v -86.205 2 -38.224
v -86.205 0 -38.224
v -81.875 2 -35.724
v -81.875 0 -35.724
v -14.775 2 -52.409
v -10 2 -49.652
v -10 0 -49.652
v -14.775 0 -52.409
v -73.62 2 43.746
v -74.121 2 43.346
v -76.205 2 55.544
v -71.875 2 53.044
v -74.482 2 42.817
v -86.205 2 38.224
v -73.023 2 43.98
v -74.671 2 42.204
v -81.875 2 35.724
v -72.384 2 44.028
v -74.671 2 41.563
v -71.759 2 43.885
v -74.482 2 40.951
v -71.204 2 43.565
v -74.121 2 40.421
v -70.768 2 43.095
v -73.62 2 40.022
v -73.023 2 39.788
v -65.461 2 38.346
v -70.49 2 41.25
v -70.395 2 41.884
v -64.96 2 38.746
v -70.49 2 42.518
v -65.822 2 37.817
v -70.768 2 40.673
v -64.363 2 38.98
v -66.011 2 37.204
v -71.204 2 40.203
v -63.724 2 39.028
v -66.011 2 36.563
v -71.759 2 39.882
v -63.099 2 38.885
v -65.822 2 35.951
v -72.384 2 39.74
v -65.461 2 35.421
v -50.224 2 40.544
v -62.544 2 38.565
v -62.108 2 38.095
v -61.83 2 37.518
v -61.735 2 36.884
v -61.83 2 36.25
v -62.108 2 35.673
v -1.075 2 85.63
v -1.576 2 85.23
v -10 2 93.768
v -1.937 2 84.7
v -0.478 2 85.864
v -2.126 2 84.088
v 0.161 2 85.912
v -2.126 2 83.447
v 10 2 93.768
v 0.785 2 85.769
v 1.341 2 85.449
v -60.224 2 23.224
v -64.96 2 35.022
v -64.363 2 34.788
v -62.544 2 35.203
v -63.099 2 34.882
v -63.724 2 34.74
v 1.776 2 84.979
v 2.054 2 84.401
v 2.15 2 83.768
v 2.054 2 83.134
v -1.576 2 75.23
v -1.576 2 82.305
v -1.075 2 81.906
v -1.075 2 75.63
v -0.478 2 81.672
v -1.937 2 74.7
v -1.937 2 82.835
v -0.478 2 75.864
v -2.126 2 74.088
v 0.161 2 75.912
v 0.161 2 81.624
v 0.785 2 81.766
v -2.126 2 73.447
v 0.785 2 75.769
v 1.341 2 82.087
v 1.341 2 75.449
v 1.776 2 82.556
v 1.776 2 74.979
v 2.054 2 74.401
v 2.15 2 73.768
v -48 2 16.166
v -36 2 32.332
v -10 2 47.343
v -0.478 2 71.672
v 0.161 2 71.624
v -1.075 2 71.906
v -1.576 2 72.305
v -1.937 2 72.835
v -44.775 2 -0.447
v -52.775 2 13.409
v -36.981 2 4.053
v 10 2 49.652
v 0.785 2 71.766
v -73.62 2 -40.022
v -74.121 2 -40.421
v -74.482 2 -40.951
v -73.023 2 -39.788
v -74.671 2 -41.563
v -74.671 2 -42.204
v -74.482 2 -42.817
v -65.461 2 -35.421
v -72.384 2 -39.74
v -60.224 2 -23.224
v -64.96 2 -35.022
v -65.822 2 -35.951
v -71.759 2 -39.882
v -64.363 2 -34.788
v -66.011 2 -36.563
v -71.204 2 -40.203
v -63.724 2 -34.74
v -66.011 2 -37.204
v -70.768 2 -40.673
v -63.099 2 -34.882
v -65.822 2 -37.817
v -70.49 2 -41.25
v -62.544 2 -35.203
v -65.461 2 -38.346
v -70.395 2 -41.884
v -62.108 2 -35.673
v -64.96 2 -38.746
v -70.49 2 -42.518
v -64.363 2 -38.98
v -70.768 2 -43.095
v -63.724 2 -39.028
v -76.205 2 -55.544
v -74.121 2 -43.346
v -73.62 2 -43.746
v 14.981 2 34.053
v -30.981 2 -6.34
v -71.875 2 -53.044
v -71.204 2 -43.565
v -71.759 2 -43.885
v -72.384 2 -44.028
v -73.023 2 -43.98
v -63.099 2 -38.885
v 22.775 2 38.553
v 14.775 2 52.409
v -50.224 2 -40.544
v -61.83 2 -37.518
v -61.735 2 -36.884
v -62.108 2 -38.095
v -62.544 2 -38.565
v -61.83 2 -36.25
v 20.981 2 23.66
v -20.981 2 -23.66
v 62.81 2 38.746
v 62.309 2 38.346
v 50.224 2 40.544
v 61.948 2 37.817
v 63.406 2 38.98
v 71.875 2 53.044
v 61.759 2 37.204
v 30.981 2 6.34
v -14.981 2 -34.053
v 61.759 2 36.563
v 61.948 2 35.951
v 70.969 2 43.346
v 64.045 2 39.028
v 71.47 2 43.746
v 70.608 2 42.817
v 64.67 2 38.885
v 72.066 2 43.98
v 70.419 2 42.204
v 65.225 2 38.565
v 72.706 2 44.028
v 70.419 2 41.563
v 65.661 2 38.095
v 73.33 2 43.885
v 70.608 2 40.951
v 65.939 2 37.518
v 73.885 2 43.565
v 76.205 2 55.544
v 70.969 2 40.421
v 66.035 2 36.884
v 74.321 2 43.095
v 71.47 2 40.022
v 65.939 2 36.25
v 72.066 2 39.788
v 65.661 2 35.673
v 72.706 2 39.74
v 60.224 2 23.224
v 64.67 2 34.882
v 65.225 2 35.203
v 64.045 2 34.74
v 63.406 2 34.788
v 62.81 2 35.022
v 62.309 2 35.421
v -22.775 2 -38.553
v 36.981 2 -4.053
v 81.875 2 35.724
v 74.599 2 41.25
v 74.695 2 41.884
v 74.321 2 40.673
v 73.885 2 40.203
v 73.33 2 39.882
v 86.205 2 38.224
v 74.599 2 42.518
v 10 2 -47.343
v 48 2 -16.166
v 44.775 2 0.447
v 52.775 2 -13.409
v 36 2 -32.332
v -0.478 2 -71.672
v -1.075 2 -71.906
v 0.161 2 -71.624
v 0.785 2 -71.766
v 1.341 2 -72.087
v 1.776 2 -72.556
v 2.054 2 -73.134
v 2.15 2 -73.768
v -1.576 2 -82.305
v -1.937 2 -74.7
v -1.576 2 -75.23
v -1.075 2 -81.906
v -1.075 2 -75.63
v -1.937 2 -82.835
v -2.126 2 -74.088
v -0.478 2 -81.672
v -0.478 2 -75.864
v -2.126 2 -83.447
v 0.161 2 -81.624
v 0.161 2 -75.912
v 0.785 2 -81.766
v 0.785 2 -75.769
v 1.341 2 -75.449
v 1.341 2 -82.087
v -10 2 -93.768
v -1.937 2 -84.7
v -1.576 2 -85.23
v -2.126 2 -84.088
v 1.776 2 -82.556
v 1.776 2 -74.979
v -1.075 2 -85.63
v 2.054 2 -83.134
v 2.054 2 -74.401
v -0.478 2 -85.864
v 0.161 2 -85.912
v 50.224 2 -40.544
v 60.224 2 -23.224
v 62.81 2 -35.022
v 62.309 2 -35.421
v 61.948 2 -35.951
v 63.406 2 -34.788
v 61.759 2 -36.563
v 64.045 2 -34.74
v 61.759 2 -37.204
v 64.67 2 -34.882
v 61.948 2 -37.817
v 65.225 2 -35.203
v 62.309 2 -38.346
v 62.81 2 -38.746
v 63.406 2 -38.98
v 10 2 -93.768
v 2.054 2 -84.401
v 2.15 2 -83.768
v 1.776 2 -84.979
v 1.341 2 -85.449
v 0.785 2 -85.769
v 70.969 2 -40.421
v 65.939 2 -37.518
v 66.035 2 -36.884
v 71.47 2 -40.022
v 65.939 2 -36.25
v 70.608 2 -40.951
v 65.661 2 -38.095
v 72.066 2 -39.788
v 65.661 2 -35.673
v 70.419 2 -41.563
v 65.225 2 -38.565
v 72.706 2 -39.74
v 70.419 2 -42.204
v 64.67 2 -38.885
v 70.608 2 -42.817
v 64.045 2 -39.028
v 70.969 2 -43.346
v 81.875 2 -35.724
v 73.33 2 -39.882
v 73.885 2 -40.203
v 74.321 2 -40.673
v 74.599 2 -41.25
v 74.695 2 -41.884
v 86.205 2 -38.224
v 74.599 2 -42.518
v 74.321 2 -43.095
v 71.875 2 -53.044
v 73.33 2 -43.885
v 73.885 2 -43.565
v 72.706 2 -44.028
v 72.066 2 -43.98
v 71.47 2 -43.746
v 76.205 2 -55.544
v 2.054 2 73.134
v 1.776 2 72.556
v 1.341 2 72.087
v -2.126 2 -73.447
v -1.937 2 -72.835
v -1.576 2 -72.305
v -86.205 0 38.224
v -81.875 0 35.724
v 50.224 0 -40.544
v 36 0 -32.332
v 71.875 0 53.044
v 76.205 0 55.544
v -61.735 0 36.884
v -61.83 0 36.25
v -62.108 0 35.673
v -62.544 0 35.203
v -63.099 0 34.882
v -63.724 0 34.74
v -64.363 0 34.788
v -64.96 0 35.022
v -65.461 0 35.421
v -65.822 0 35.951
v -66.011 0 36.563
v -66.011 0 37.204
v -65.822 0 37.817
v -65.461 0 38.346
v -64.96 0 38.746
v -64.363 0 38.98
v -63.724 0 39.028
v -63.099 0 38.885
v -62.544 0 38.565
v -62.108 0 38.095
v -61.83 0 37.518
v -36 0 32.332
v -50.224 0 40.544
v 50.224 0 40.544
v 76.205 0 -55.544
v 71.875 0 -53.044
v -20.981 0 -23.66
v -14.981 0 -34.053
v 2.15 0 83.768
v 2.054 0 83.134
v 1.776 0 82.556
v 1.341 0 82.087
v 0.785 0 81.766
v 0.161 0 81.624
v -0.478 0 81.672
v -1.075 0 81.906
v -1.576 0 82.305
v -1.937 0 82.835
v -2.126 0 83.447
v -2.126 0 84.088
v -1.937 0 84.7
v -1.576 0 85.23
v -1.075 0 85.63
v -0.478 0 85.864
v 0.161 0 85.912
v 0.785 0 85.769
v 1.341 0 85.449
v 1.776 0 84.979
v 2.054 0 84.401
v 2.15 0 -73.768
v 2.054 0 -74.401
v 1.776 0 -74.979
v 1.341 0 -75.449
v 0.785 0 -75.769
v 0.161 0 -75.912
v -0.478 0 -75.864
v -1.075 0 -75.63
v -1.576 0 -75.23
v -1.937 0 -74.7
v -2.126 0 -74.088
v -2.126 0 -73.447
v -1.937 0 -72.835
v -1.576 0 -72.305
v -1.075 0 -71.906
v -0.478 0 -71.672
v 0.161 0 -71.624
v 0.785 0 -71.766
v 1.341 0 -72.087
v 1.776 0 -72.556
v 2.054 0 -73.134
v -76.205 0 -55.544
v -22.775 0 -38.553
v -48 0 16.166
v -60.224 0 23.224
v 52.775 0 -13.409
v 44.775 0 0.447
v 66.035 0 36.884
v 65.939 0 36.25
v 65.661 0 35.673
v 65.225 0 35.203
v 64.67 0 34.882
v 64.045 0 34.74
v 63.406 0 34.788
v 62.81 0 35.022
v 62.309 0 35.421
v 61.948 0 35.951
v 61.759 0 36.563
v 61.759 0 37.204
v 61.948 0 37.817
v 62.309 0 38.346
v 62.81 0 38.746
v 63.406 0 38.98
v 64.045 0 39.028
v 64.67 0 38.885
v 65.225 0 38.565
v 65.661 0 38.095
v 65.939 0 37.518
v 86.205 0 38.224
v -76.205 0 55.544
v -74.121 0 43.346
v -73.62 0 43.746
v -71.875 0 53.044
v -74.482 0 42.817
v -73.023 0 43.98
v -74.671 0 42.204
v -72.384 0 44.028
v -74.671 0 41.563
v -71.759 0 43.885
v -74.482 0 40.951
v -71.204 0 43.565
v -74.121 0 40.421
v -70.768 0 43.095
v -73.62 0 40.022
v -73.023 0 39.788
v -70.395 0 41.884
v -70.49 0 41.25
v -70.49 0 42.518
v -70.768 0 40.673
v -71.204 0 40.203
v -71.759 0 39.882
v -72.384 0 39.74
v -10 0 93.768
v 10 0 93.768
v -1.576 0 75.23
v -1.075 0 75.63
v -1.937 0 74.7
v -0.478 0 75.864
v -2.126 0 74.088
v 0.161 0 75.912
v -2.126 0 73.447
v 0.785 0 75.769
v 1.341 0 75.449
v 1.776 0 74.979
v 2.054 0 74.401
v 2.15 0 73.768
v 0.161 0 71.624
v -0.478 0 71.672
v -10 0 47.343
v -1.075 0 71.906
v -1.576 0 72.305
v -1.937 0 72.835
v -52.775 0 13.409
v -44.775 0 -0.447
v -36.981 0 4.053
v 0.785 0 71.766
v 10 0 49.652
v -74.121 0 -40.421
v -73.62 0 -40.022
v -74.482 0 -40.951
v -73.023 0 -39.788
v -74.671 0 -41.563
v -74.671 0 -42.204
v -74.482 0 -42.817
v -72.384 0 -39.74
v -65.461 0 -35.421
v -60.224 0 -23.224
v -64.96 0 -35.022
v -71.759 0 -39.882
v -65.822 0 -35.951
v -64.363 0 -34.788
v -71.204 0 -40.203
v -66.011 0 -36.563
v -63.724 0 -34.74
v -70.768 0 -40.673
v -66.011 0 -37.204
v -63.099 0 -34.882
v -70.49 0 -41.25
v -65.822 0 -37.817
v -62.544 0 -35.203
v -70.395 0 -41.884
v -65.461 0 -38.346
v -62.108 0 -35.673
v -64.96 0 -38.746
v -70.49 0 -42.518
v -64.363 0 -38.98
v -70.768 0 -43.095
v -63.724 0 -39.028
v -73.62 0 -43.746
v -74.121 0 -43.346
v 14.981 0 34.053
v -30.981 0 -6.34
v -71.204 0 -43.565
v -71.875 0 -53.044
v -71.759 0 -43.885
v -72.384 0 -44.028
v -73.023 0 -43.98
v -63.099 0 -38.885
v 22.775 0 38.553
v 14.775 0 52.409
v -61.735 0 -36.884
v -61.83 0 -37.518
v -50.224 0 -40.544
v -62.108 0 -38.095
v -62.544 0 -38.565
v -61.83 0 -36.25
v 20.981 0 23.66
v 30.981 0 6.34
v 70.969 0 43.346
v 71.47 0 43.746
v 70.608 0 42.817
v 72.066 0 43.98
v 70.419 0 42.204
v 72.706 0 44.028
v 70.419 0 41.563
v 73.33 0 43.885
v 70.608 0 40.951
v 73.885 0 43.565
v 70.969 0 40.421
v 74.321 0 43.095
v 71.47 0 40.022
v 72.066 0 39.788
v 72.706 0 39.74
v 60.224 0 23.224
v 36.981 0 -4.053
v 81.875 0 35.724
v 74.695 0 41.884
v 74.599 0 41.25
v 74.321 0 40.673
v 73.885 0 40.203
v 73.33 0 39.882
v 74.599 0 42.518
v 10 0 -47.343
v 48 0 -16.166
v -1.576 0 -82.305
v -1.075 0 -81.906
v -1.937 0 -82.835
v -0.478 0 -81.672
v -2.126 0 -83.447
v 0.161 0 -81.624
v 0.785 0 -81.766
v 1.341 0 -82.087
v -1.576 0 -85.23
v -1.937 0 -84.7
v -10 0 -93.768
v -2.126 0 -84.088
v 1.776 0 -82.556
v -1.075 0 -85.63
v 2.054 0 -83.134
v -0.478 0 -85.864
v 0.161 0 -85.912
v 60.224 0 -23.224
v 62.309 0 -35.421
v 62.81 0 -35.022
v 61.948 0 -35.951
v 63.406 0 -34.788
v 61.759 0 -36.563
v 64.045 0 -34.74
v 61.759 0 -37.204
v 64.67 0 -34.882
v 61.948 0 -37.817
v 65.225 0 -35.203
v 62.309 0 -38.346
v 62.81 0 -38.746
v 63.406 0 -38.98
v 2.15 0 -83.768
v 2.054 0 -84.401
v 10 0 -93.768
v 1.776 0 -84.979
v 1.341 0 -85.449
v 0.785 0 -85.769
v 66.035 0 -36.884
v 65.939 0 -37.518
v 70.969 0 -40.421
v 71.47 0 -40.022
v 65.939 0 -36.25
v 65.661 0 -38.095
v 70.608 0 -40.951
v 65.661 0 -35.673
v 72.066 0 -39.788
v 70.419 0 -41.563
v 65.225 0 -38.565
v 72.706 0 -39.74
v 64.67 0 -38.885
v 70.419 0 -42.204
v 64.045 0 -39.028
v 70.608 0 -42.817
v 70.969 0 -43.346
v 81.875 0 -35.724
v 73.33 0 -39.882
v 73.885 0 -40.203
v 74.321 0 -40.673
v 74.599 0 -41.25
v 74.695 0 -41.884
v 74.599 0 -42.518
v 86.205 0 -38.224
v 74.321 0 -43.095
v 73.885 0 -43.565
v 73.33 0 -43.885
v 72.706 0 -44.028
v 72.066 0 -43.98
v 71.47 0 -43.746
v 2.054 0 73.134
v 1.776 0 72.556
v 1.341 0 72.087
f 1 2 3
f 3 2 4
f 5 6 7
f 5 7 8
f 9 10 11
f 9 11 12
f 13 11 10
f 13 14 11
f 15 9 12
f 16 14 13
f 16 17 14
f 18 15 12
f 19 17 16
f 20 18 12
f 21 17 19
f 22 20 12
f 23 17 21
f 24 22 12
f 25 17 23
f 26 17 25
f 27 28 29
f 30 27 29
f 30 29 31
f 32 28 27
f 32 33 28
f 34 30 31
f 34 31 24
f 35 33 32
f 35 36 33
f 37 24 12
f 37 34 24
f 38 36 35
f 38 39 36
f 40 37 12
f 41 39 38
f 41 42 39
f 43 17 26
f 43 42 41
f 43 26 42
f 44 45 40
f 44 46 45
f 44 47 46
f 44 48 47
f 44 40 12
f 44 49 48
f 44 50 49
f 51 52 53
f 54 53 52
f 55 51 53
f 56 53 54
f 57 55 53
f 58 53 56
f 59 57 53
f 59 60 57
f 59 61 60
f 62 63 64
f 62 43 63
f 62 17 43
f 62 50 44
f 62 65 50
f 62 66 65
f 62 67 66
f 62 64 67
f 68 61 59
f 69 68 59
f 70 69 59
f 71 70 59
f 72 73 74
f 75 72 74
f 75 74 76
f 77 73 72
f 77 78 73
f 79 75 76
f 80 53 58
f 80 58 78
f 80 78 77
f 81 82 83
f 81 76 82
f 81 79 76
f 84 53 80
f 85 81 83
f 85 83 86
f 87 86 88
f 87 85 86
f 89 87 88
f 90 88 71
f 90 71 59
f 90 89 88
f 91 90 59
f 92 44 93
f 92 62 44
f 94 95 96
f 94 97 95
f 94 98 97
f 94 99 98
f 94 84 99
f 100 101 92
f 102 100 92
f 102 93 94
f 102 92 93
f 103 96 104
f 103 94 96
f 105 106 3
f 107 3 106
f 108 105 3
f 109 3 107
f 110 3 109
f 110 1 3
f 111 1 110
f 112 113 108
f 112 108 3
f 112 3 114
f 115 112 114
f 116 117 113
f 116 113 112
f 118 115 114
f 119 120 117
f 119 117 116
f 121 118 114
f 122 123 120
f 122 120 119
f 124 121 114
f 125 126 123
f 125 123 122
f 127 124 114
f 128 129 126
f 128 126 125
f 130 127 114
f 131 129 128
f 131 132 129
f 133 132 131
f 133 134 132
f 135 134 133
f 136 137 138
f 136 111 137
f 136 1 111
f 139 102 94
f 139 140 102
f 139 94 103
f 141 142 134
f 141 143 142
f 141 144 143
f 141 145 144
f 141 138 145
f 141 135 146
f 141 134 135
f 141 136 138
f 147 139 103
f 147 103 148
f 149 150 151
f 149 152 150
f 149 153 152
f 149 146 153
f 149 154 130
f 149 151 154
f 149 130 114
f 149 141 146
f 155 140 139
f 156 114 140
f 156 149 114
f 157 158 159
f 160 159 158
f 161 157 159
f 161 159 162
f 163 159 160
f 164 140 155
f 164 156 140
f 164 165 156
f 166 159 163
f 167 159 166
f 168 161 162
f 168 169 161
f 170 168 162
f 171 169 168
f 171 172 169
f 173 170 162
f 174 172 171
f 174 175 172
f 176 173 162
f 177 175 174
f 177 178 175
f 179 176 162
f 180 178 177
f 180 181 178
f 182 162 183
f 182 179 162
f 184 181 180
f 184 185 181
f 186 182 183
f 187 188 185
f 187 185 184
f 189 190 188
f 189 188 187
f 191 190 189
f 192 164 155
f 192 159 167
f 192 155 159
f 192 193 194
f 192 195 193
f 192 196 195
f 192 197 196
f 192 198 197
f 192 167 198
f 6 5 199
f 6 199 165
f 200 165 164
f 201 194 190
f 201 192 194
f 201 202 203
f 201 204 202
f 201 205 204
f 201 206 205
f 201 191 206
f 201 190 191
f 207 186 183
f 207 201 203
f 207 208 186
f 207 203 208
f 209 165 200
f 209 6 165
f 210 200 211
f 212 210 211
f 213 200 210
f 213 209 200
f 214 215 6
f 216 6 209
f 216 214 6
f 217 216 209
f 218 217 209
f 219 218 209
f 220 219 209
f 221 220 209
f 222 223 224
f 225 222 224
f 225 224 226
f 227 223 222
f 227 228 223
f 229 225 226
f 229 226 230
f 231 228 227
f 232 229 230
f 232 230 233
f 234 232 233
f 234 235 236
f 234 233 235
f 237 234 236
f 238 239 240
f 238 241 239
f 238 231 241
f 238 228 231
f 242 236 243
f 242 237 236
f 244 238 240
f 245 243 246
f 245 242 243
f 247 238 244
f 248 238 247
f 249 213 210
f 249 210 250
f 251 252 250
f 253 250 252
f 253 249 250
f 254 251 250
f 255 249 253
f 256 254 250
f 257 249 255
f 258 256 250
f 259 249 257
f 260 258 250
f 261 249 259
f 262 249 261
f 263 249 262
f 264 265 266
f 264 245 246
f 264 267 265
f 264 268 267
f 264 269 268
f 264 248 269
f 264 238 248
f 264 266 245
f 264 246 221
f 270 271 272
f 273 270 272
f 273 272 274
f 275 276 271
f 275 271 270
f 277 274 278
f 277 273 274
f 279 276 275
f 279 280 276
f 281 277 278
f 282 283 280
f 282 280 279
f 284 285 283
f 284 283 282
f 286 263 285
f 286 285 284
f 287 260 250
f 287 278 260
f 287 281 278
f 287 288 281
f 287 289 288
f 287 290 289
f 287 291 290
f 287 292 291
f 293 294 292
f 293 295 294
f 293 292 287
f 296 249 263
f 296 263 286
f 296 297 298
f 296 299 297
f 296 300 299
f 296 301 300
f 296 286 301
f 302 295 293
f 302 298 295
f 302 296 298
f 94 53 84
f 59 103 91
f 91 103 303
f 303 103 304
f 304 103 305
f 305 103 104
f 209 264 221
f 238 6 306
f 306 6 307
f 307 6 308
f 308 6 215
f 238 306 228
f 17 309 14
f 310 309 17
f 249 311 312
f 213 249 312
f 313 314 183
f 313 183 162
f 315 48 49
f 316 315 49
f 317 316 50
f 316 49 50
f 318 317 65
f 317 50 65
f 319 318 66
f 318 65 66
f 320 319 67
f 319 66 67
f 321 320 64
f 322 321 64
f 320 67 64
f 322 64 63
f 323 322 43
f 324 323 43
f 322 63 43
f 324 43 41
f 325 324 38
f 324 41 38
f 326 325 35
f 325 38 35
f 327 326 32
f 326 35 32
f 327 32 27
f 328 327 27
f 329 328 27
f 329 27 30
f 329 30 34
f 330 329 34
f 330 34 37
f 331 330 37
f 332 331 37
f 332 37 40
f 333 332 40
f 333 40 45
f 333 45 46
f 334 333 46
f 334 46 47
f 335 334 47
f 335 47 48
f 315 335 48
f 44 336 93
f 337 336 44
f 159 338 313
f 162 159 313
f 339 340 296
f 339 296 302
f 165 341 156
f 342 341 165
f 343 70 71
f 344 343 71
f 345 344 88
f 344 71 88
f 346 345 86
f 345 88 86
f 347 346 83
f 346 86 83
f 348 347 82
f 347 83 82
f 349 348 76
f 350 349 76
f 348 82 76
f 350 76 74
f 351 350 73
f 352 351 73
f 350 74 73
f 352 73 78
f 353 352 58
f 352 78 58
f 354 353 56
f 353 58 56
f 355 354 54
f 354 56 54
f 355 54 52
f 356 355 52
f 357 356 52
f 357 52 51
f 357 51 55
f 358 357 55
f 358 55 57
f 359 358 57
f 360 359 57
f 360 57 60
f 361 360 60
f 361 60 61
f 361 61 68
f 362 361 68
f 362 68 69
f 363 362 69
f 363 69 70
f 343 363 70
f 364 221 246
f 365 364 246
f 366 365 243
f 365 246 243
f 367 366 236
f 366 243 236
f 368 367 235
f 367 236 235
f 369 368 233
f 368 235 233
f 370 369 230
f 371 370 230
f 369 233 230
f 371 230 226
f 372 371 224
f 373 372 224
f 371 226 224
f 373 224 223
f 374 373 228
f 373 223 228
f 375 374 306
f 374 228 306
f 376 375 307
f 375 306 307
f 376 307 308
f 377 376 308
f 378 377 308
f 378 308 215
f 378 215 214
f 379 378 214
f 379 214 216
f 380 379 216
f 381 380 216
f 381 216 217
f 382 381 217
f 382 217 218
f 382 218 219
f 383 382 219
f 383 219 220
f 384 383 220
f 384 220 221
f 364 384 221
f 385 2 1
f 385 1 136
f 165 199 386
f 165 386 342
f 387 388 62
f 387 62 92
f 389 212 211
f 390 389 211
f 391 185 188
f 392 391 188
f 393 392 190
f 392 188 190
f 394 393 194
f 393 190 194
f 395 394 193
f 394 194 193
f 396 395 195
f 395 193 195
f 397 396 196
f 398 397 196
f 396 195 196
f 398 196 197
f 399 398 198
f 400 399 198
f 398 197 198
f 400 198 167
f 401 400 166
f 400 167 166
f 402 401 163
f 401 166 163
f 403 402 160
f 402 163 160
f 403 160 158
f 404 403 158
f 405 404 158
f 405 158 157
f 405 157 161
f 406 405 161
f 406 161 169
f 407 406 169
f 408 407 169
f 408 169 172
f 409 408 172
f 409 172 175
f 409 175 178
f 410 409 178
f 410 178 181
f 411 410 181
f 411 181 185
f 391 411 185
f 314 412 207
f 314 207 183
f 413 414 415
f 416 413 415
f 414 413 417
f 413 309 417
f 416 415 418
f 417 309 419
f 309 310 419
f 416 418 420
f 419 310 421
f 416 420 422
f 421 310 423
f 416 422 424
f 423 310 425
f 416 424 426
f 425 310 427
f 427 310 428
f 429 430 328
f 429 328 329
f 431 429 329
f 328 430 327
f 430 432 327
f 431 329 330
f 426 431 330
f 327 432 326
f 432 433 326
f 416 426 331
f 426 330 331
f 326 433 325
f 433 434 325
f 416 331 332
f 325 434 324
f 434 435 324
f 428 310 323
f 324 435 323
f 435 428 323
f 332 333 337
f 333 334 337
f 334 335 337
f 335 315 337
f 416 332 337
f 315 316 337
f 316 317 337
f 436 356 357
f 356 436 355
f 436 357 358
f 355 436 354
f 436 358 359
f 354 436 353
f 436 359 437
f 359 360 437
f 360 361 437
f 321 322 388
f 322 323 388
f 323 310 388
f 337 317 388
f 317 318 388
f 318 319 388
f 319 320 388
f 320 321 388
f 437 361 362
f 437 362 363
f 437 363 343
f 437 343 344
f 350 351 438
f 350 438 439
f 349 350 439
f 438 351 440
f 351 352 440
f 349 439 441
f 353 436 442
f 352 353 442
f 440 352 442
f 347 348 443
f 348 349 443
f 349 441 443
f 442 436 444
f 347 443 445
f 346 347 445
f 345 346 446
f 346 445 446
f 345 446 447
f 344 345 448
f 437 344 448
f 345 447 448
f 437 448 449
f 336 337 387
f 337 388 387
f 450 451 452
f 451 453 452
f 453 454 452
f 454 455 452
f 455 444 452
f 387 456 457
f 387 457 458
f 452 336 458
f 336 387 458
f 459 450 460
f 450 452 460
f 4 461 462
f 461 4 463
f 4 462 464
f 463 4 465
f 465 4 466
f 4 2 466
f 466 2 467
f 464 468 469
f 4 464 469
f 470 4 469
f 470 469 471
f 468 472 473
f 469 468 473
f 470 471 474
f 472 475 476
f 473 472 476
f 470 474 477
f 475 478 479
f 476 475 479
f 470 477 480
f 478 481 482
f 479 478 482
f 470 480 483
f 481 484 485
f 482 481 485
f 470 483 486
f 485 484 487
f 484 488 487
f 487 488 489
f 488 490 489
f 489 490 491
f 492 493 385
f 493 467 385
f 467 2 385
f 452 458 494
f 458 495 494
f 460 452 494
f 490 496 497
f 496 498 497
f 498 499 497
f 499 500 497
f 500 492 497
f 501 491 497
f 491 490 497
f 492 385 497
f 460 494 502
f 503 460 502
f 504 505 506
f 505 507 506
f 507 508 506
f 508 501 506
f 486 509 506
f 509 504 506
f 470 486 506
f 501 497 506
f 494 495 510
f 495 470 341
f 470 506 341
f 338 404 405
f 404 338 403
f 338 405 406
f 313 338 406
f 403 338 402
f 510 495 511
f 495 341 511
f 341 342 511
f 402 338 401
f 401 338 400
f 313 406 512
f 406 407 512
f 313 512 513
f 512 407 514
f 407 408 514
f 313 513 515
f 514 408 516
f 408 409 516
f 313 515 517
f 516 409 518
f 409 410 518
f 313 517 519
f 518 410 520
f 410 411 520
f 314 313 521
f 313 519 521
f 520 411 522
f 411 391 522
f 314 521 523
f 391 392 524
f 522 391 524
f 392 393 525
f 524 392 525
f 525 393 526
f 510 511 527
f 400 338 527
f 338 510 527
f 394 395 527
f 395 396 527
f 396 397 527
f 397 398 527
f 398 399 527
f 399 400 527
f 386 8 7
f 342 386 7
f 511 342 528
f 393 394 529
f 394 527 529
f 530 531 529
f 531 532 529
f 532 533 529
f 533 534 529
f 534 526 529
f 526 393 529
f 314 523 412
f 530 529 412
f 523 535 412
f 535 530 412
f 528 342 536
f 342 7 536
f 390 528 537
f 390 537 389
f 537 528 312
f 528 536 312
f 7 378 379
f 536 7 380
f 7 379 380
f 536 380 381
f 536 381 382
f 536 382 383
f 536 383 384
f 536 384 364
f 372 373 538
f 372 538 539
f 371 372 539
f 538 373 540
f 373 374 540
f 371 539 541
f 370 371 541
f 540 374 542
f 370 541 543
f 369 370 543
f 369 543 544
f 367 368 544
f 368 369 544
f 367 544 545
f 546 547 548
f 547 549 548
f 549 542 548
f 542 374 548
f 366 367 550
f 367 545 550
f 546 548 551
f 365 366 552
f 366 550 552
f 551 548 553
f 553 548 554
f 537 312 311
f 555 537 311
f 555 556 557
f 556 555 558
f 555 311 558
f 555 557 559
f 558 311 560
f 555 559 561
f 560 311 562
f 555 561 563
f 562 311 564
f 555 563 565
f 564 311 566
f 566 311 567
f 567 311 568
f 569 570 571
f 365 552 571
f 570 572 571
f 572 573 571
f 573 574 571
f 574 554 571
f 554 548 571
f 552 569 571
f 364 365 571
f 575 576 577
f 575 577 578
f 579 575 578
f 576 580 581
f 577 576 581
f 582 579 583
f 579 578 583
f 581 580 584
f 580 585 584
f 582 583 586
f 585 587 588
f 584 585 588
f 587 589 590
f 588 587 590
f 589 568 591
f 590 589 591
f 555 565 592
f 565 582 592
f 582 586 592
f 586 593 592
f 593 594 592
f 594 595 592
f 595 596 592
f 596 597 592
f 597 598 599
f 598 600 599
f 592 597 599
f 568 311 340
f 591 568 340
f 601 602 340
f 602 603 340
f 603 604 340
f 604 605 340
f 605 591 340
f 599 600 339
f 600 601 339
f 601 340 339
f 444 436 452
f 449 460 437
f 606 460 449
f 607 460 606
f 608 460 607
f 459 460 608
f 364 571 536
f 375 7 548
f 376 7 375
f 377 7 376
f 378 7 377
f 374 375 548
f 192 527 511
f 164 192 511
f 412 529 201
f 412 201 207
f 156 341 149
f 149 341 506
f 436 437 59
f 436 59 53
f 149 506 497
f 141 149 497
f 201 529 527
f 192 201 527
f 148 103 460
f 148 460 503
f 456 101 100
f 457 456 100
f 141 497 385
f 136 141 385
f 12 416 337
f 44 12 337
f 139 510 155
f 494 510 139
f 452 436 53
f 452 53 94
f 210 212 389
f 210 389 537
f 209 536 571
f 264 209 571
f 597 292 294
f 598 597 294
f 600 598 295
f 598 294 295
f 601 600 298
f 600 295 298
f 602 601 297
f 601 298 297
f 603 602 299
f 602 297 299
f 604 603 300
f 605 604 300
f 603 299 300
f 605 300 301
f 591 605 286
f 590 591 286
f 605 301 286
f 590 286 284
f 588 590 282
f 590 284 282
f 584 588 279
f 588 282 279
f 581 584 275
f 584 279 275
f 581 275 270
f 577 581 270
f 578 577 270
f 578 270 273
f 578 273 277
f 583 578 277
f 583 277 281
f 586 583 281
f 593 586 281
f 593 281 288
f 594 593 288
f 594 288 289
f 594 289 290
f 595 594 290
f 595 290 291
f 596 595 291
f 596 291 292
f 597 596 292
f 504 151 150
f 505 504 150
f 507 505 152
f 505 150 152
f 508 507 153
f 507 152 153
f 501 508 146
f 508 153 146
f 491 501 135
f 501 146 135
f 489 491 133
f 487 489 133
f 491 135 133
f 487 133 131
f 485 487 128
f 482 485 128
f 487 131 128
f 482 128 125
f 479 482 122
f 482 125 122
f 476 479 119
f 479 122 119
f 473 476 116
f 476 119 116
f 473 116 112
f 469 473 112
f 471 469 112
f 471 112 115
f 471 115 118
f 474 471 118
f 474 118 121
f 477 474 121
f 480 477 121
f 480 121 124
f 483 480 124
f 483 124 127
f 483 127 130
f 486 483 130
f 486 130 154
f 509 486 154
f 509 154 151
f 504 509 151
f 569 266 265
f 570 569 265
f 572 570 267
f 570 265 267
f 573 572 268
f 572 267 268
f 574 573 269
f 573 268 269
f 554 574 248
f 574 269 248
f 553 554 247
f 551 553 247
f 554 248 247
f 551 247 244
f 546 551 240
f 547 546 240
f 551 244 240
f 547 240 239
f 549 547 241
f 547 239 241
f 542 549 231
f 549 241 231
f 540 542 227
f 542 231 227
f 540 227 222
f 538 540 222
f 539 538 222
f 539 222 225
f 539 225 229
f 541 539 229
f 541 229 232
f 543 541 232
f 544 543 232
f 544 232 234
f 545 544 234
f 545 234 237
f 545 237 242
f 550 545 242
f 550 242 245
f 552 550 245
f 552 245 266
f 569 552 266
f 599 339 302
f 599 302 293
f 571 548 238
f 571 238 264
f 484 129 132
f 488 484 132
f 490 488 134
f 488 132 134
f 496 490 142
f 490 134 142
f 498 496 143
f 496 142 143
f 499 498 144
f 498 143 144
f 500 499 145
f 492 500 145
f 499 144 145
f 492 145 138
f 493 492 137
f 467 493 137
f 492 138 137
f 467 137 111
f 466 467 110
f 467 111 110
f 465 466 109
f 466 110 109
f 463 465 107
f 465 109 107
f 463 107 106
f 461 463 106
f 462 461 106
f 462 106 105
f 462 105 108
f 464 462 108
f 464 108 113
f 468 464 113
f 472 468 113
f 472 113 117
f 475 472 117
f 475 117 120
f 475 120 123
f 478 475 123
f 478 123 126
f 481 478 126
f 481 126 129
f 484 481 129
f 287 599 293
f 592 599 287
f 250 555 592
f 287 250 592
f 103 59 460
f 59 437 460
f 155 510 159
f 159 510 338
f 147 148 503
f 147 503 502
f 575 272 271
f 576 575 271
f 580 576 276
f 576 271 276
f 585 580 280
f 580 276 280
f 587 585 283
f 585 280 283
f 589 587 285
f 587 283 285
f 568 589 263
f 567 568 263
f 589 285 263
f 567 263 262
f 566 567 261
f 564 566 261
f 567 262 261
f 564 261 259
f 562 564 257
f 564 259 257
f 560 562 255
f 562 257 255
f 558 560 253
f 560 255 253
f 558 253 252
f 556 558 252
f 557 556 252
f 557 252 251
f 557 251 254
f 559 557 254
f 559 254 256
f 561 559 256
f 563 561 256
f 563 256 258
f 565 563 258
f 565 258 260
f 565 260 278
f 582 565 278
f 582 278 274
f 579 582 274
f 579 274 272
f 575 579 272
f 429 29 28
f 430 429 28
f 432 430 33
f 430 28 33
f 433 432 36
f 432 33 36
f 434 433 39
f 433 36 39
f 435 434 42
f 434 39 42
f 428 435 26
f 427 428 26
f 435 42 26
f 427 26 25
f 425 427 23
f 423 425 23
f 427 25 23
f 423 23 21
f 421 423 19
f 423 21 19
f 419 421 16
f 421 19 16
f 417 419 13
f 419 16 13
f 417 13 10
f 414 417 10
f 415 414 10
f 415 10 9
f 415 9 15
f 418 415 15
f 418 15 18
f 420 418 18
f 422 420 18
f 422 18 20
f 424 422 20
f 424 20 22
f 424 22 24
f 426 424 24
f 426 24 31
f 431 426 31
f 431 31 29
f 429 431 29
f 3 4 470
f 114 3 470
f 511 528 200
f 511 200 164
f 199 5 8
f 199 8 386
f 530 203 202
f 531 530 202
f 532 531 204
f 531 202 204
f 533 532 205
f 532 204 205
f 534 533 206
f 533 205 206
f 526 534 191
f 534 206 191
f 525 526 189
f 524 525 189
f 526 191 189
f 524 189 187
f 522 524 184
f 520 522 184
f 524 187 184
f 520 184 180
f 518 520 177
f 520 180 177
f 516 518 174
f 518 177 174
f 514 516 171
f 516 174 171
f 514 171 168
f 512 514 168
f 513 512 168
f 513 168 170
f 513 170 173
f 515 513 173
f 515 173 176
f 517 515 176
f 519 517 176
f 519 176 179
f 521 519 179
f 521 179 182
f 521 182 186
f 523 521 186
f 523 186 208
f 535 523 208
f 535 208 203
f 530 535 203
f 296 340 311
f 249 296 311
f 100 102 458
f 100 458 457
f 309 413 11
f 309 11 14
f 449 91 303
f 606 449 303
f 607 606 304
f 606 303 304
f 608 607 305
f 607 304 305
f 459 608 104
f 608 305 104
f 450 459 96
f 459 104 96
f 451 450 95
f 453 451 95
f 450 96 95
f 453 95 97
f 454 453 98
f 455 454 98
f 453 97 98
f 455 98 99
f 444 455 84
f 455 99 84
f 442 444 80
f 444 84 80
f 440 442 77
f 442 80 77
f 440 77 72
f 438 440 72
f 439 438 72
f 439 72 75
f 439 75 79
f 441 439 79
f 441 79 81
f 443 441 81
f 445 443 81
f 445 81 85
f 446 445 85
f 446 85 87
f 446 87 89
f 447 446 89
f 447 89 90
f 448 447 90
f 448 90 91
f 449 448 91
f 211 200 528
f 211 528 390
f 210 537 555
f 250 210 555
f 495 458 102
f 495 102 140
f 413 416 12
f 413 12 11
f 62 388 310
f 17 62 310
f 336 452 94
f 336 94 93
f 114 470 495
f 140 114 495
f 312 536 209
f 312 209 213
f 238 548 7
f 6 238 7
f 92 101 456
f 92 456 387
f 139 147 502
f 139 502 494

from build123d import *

# Parameters (mm, degrees)
BOSS_EXTRUDE2_DEPTH = 2
SKETCH2_R           = 2.15
CUT_EXTRUDE1_DEPTH  = 10
CUT_EXTRUDE3_DEPTH  = 30
BOSS_EXTRUDE4_DEPTH = 2
SKETCH9_W           = 20
SKETCH9_H           = 40
BOSS_EXTRUDE5_DEPTH = 2
CUT_EXTRUDE4_DEPTH  = 2
BOSS_EXTRUDE6_DEPTH = 2
BOSS_EXTRUDE7_DEPTH = 2
CUT_EXTRUDE5_DEPTH  = 2


with BuildPart() as part:
    # Sketch1 → Boss-Extrude2 (new body)
    with BuildSketch(Plane(origin=(0, 0, 0), x_dir=(1, 0, 0), z_dir=(0, 1, 0))):
        Polygon((102.5, 0), (51.25, 88.767603888), (-51.25, 88.767603888), (-102.5, 0), (-51.25, -88.767603888), (51.25, -88.767603888), align=None)
        Polygon((73.632486541, 0), (36.81624327, 63.767603888), (10, 63.767603888), (10, 45.767603888), (30, 45.767603888), (30, -45.767603888), (10, -45.767603888), (10, -63.767603888), (36.81624327, -63.767603888), align=None, mode=Mode.SUBTRACT)
        Polygon((-10, 63.767603888), (-36.81624327, 63.767603888), (-73.632486541, 0), (-36.81624327, -63.767603888), (-10, -63.767603888), (-10, -45.767603888), (-30, -45.767603888), (-30, 45.767603888), (-10, 45.767603888), align=None, mode=Mode.SUBTRACT)
    extrude(amount=BOSS_EXTRUDE2_DEPTH)

    # Sketch2 → Cut-Extrude1 (cut)
    with BuildSketch(Plane(origin=(0, 2, 0), x_dir=(1, 0, 0), z_dir=(0, 1, 0))):
        with Locations((-72.544872981, -41.883801944)):
            Circle(SKETCH2_R)
        with Locations((-63.884618943, -36.883801944)):
            Circle(SKETCH2_R)
        with Locations((-72.544872981, 41.883801944)):
            Circle(SKETCH2_R)
        with Locations((-63.884618943, 36.883801944)):
            Circle(SKETCH2_R)
        with Locations((0, 83.767603888)):
            Circle(SKETCH2_R)
        with Locations((0, 73.767603888)):
            Circle(SKETCH2_R)
        with Locations((72.544872981, 41.883801944)):
            Circle(SKETCH2_R)
        with Locations((63.884618943, 36.883801944)):
            Circle(SKETCH2_R)
        with Locations((72.544872981, -41.883801944)):
            Circle(SKETCH2_R)
        with Locations((63.884618943, -36.883801944)):
            Circle(SKETCH2_R)
        with Locations((0, -83.767603888)):
            Circle(SKETCH2_R)
        with Locations((0, -73.767603888)):
            Circle(SKETCH2_R)
    extrude(amount=-CUT_EXTRUDE1_DEPTH, mode=Mode.SUBTRACT)

    # Sketch7 → Cut-Extrude3 (cut)
    with BuildSketch(Plane.XZ):
        Polygon((73.632486541, 0), (36.81624327, 63.767603888), (-36.81624327, 63.767603888), (-73.632486541, 0), (-36.81624327, -63.767603888), (36.81624327, -63.767603888), align=None)
    extrude(amount=-CUT_EXTRUDE3_DEPTH, mode=Mode.SUBTRACT)



with BuildPart() as body_2:
    # Sketch8 → Boss-Extrude4 (new body)
    with BuildSketch(Plane.XZ):
        Polygon((2.980762114, 54.837168574), (-23, 39.837168574), (0, 0), (25.980762114, 15), align=None)
        Polygon((-23, 39.837168574), (-48.980762114, 24.837168574), (-2.980762114, -54.837168574), (48.980762114, -24.837168574), (25.980762114, 15), (0, 0), align=None)
    extrude(amount=-BOSS_EXTRUDE4_DEPTH)


with BuildPart() as part_1:
    add(part.part)

    add(body_2.part)  # Boss-Extrude5 merges body 2
    # Sketch9 → Boss-Extrude5 (add)
    with BuildSketch(Plane(origin=(0, 0, 0), x_dir=(-1, 0, 0), z_dir=(0, -1, 0))):
        Polygon((60.224364905, -23.223547906), (25.583348754, -3.223547906), (15.583348754, -20.544055982), (50.224364905, -40.544055982), align=None)
        with Locations((0, -43.767603888)):
            Rectangle(SKETCH9_W, SKETCH9_H)
        Polygon((-60.224364905, -23.223547906), (-25.583348754, -3.223547906), (-15.583348754, -20.544055982), (-50.224364905, -40.544055982), align=None)
        Polygon((-50.224364905, 40.544055982), (-15.583348754, 20.544055982), (-25.583348754, 3.223547906), (-60.224364905, 23.223547906), align=None)
        with Locations((0, 43.767603888)):
            Rectangle(SKETCH9_W, SKETCH9_H)
        Polygon((60.224364905, 23.223547906), (25.583348754, 3.223547906), (15.583348754, 20.544055982), (50.224364905, 40.544055982), align=None)
    extrude(amount=-BOSS_EXTRUDE5_DEPTH)

    # Sketch10 → Cut-Extrude4 (cut)
    with BuildSketch(Plane(origin=(0, 0, 0), x_dir=(-1, 0, 0), z_dir=(0, -1, 0))):
        Polygon((60.224364905, -23.223547906), (98.115262944, -45.099868089), (121.783609118, 0), (103.941012458, 48.463366139), (60.224364905, 23.223547906), align=None)
        Polygon((10, -107.520244253), (60.891804559, -105.467699261), (93.941012458, -65.783874214), (50.224364905, -40.544055982), (10, -63.767603888), align=None)
        Polygon((-88.115262944, -62.420376164), (-60.891804559, -105.467699261), (-10, -114.247240353), (-10, -63.767603888), (-50.224364905, -40.544055982), align=None)
        Polygon((-98.115262944, 45.099868089), (-121.783609118, 0), (-103.941012458, -48.463366139), (-60.224364905, -23.223547906), (-60.224364905, 23.223547906), align=None)
        Polygon((-10, 107.520244253), (-60.891804559, 105.467699261), (-93.941012458, 65.783874214), (-50.224364905, 40.544055982), (-10, 63.767603888), align=None)
        Polygon((88.115262944, 62.420376164), (60.891804559, 105.467699261), (10, 114.247240353), (10, 63.767603888), (50.224364905, 40.544055982), align=None)
    extrude(amount=-CUT_EXTRUDE4_DEPTH, mode=Mode.SUBTRACT)

    # Sketch12 → Boss-Extrude6 (add)
    with BuildSketch(Plane.XZ):
        Polygon((-81.205127019, -46.883801944), (-86.205127019, -38.223547906), (-81.875, -35.723547906), (-71.875, -53.044055982), (-76.205127019, -55.544055982), align=None)
        Polygon((-81.205127019, 46.883801944), (-86.205127019, 38.223547906), (-81.875, 35.723547906), (-71.875, 53.044055982), (-76.205127019, 55.544055982), align=None)
        Polygon((0, 93.767603888), (-10, 93.767603888), (-10, 88.767603888), (10, 88.767603888), (10, 93.767603888), align=None)
        Polygon((81.205127019, 46.883801944), (76.205127019, 55.544055982), (71.875, 53.044055982), (81.875, 35.723547906), (86.205127019, 38.223547906), align=None)
        Polygon((81.205127019, -46.883801944), (86.205127019, -38.223547906), (81.875, -35.723547906), (71.875, -53.044055982), (76.205127019, -55.544055982), align=None)
        Polygon((0, -93.767603888), (10, -93.767603888), (10, -88.767603888), (-10, -88.767603888), (-10, -93.767603888), align=None)
    extrude(amount=-BOSS_EXTRUDE6_DEPTH)

    # Sketch14 → Boss-Extrude7 (add)
    with BuildSketch(Plane(origin=(0, 2, 0), x_dir=(1, 0, 0), z_dir=(0, 1, 0))):
        Polygon((-18.239092363, 54.408965344), (-26.239092363, 40.552558883), (-14.980762114, 34.052558883), (-10, 42.679491924), (-10, 49.65212315), align=None)
        Polygon((41.961524227, 12.679491924), (36.980762114, 4.052558883), (48.239092363, -2.447441117), (56.239092363, 11.408965344), (48, 16.165807537), align=None)
        Polygon((26.239092363, -40.552558883), (14.980762114, -34.052558883), (10, -42.679491924), (10, -49.65212315), (18.239092363, -54.408965344), align=None)
        Polygon((-36.980762114, -4.052558883), (-48.239092363, 2.447441117), (-56.239092363, -11.408965344), (-48, -16.165807537), (-41.961524227, -12.679491924), align=None)
    extrude(amount=-BOSS_EXTRUDE7_DEPTH)

    # Sketch15 → Cut-Extrude5 (cut)
    with BuildSketch(Plane(origin=(0, 2, 0), x_dir=(1, 0, 0), z_dir=(0, 1, 0))):
        Polygon((-18.239092363, 54.408965344), (-14.774990748, 52.408965344), (-22.774990748, 38.552558883), (-26.239092363, 40.552558883), align=None)
        Polygon((-44.774990748, 0.447441117), (-48.239092363, 2.447441117), (-56.239092363, -11.408965344), (-52.774990748, -13.408965344), align=None)
        Polygon((18.239092363, -54.408965344), (14.774990748, -52.408965344), (22.774990748, -38.552558883), (26.239092363, -40.552558883), align=None)
        Polygon((44.774990748, -0.447441117), (48.239092363, -2.447441117), (56.239092363, 11.408965344), (52.774990748, 13.408965344), align=None)
    extrude(amount=-CUT_EXTRUDE5_DEPTH, mode=Mode.SUBTRACT)


solid = part_1.part
